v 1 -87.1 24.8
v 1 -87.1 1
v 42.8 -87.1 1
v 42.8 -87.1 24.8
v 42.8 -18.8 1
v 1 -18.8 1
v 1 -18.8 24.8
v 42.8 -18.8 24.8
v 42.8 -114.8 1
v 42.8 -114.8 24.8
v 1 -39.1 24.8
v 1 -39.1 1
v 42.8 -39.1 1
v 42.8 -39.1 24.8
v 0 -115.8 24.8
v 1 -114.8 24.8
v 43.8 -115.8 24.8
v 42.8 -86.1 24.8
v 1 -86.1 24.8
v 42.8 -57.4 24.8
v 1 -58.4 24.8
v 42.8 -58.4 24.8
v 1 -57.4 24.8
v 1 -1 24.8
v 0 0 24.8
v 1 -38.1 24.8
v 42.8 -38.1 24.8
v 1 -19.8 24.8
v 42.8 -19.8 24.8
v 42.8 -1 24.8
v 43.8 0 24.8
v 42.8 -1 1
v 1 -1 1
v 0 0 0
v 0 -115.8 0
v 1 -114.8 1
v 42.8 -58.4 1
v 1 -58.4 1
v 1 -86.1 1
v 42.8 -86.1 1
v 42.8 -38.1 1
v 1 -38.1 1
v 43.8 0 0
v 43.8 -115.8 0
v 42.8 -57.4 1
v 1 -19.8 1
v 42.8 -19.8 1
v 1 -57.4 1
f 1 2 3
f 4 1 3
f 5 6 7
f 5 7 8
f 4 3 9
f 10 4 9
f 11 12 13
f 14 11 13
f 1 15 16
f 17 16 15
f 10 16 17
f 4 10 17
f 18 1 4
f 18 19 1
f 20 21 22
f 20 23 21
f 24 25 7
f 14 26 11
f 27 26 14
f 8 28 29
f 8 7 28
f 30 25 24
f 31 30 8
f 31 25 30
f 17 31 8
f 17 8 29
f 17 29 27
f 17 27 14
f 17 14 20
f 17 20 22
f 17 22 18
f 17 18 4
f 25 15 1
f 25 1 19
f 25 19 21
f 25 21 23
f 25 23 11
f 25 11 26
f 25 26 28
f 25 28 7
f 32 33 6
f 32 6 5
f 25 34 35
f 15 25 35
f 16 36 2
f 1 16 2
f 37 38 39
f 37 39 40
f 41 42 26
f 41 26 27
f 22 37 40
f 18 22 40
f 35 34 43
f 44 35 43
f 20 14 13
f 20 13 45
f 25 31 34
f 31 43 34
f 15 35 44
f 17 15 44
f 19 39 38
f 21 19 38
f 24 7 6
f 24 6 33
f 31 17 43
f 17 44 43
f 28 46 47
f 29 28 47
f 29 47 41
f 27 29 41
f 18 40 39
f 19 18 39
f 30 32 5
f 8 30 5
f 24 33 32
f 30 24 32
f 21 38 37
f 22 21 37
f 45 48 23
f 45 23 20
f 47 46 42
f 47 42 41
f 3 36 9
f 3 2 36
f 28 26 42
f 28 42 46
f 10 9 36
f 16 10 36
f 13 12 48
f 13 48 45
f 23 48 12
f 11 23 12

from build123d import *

# Parameters (mm, degrees)
F0_W     = 43.8
F0_H     = 115.8
F1_DEPTH = 1
F2_W     = 41.8
F2_H     = 1
F3_DEPTH = 23.8


# Not quite as in the source:
# - a feature names something its author has since deleted; it is built from what else it names


with BuildPart() as f1:
    # F0 (on Top) → F1 (new body)
    with BuildSketch(Plane.XY):
        with Locations((21.9, -57.9)):
            Rectangle(F0_W, F0_H)
    extrude(amount=F1_DEPTH)

    # F2 (on face) → F3 (join)
    with BuildSketch(Plane.XY.offset(1)):
        Polygon((0, -114.8), (0, -115.8), (43.8, -115.8), (43.8, -114.8), (42.8, -114.8), (1, -114.8), align=None)
        Polygon((0, 0), (0, -114.8), (1, -114.8), (1, -87.35), (1, -87.1), (1, -86.35), (1, -86.1), (1, -58.4), (1, -57.4), (1, -39.1), (1, -38.1), (1, -19.8), (1, -18.8), (1, -1), (1, 0), align=None)
        Polygon((42.8, -114.8), (43.8, -114.8), (43.8, 0), (42.8, 0), (42.8, -1), (42.8, -18.8), (42.8, -19.8), (42.8, -38.1), (42.8, -39.1), (42.8, -57.4), (42.8, -58.4), (42.8, -86.1), (42.8, -87.1), align=None)
        with Locations((21.9, -0.5)):
            Rectangle(F2_W, F2_H)
        with Locations((21.9, -19.3)):
            Rectangle(F2_W, F2_H)
        with Locations((21.9, -38.6)):
            Rectangle(F2_W, F2_H)
        with Locations((21.9, -57.9)):
            Rectangle(F2_W, F2_H)
        Polygon((1, -87.1), (42.8, -87.1), (42.8, -86.1), (1, -86.1), (1, -86.35), align=None)
    extrude(amount=F3_DEPTH)


solid = f1.part
